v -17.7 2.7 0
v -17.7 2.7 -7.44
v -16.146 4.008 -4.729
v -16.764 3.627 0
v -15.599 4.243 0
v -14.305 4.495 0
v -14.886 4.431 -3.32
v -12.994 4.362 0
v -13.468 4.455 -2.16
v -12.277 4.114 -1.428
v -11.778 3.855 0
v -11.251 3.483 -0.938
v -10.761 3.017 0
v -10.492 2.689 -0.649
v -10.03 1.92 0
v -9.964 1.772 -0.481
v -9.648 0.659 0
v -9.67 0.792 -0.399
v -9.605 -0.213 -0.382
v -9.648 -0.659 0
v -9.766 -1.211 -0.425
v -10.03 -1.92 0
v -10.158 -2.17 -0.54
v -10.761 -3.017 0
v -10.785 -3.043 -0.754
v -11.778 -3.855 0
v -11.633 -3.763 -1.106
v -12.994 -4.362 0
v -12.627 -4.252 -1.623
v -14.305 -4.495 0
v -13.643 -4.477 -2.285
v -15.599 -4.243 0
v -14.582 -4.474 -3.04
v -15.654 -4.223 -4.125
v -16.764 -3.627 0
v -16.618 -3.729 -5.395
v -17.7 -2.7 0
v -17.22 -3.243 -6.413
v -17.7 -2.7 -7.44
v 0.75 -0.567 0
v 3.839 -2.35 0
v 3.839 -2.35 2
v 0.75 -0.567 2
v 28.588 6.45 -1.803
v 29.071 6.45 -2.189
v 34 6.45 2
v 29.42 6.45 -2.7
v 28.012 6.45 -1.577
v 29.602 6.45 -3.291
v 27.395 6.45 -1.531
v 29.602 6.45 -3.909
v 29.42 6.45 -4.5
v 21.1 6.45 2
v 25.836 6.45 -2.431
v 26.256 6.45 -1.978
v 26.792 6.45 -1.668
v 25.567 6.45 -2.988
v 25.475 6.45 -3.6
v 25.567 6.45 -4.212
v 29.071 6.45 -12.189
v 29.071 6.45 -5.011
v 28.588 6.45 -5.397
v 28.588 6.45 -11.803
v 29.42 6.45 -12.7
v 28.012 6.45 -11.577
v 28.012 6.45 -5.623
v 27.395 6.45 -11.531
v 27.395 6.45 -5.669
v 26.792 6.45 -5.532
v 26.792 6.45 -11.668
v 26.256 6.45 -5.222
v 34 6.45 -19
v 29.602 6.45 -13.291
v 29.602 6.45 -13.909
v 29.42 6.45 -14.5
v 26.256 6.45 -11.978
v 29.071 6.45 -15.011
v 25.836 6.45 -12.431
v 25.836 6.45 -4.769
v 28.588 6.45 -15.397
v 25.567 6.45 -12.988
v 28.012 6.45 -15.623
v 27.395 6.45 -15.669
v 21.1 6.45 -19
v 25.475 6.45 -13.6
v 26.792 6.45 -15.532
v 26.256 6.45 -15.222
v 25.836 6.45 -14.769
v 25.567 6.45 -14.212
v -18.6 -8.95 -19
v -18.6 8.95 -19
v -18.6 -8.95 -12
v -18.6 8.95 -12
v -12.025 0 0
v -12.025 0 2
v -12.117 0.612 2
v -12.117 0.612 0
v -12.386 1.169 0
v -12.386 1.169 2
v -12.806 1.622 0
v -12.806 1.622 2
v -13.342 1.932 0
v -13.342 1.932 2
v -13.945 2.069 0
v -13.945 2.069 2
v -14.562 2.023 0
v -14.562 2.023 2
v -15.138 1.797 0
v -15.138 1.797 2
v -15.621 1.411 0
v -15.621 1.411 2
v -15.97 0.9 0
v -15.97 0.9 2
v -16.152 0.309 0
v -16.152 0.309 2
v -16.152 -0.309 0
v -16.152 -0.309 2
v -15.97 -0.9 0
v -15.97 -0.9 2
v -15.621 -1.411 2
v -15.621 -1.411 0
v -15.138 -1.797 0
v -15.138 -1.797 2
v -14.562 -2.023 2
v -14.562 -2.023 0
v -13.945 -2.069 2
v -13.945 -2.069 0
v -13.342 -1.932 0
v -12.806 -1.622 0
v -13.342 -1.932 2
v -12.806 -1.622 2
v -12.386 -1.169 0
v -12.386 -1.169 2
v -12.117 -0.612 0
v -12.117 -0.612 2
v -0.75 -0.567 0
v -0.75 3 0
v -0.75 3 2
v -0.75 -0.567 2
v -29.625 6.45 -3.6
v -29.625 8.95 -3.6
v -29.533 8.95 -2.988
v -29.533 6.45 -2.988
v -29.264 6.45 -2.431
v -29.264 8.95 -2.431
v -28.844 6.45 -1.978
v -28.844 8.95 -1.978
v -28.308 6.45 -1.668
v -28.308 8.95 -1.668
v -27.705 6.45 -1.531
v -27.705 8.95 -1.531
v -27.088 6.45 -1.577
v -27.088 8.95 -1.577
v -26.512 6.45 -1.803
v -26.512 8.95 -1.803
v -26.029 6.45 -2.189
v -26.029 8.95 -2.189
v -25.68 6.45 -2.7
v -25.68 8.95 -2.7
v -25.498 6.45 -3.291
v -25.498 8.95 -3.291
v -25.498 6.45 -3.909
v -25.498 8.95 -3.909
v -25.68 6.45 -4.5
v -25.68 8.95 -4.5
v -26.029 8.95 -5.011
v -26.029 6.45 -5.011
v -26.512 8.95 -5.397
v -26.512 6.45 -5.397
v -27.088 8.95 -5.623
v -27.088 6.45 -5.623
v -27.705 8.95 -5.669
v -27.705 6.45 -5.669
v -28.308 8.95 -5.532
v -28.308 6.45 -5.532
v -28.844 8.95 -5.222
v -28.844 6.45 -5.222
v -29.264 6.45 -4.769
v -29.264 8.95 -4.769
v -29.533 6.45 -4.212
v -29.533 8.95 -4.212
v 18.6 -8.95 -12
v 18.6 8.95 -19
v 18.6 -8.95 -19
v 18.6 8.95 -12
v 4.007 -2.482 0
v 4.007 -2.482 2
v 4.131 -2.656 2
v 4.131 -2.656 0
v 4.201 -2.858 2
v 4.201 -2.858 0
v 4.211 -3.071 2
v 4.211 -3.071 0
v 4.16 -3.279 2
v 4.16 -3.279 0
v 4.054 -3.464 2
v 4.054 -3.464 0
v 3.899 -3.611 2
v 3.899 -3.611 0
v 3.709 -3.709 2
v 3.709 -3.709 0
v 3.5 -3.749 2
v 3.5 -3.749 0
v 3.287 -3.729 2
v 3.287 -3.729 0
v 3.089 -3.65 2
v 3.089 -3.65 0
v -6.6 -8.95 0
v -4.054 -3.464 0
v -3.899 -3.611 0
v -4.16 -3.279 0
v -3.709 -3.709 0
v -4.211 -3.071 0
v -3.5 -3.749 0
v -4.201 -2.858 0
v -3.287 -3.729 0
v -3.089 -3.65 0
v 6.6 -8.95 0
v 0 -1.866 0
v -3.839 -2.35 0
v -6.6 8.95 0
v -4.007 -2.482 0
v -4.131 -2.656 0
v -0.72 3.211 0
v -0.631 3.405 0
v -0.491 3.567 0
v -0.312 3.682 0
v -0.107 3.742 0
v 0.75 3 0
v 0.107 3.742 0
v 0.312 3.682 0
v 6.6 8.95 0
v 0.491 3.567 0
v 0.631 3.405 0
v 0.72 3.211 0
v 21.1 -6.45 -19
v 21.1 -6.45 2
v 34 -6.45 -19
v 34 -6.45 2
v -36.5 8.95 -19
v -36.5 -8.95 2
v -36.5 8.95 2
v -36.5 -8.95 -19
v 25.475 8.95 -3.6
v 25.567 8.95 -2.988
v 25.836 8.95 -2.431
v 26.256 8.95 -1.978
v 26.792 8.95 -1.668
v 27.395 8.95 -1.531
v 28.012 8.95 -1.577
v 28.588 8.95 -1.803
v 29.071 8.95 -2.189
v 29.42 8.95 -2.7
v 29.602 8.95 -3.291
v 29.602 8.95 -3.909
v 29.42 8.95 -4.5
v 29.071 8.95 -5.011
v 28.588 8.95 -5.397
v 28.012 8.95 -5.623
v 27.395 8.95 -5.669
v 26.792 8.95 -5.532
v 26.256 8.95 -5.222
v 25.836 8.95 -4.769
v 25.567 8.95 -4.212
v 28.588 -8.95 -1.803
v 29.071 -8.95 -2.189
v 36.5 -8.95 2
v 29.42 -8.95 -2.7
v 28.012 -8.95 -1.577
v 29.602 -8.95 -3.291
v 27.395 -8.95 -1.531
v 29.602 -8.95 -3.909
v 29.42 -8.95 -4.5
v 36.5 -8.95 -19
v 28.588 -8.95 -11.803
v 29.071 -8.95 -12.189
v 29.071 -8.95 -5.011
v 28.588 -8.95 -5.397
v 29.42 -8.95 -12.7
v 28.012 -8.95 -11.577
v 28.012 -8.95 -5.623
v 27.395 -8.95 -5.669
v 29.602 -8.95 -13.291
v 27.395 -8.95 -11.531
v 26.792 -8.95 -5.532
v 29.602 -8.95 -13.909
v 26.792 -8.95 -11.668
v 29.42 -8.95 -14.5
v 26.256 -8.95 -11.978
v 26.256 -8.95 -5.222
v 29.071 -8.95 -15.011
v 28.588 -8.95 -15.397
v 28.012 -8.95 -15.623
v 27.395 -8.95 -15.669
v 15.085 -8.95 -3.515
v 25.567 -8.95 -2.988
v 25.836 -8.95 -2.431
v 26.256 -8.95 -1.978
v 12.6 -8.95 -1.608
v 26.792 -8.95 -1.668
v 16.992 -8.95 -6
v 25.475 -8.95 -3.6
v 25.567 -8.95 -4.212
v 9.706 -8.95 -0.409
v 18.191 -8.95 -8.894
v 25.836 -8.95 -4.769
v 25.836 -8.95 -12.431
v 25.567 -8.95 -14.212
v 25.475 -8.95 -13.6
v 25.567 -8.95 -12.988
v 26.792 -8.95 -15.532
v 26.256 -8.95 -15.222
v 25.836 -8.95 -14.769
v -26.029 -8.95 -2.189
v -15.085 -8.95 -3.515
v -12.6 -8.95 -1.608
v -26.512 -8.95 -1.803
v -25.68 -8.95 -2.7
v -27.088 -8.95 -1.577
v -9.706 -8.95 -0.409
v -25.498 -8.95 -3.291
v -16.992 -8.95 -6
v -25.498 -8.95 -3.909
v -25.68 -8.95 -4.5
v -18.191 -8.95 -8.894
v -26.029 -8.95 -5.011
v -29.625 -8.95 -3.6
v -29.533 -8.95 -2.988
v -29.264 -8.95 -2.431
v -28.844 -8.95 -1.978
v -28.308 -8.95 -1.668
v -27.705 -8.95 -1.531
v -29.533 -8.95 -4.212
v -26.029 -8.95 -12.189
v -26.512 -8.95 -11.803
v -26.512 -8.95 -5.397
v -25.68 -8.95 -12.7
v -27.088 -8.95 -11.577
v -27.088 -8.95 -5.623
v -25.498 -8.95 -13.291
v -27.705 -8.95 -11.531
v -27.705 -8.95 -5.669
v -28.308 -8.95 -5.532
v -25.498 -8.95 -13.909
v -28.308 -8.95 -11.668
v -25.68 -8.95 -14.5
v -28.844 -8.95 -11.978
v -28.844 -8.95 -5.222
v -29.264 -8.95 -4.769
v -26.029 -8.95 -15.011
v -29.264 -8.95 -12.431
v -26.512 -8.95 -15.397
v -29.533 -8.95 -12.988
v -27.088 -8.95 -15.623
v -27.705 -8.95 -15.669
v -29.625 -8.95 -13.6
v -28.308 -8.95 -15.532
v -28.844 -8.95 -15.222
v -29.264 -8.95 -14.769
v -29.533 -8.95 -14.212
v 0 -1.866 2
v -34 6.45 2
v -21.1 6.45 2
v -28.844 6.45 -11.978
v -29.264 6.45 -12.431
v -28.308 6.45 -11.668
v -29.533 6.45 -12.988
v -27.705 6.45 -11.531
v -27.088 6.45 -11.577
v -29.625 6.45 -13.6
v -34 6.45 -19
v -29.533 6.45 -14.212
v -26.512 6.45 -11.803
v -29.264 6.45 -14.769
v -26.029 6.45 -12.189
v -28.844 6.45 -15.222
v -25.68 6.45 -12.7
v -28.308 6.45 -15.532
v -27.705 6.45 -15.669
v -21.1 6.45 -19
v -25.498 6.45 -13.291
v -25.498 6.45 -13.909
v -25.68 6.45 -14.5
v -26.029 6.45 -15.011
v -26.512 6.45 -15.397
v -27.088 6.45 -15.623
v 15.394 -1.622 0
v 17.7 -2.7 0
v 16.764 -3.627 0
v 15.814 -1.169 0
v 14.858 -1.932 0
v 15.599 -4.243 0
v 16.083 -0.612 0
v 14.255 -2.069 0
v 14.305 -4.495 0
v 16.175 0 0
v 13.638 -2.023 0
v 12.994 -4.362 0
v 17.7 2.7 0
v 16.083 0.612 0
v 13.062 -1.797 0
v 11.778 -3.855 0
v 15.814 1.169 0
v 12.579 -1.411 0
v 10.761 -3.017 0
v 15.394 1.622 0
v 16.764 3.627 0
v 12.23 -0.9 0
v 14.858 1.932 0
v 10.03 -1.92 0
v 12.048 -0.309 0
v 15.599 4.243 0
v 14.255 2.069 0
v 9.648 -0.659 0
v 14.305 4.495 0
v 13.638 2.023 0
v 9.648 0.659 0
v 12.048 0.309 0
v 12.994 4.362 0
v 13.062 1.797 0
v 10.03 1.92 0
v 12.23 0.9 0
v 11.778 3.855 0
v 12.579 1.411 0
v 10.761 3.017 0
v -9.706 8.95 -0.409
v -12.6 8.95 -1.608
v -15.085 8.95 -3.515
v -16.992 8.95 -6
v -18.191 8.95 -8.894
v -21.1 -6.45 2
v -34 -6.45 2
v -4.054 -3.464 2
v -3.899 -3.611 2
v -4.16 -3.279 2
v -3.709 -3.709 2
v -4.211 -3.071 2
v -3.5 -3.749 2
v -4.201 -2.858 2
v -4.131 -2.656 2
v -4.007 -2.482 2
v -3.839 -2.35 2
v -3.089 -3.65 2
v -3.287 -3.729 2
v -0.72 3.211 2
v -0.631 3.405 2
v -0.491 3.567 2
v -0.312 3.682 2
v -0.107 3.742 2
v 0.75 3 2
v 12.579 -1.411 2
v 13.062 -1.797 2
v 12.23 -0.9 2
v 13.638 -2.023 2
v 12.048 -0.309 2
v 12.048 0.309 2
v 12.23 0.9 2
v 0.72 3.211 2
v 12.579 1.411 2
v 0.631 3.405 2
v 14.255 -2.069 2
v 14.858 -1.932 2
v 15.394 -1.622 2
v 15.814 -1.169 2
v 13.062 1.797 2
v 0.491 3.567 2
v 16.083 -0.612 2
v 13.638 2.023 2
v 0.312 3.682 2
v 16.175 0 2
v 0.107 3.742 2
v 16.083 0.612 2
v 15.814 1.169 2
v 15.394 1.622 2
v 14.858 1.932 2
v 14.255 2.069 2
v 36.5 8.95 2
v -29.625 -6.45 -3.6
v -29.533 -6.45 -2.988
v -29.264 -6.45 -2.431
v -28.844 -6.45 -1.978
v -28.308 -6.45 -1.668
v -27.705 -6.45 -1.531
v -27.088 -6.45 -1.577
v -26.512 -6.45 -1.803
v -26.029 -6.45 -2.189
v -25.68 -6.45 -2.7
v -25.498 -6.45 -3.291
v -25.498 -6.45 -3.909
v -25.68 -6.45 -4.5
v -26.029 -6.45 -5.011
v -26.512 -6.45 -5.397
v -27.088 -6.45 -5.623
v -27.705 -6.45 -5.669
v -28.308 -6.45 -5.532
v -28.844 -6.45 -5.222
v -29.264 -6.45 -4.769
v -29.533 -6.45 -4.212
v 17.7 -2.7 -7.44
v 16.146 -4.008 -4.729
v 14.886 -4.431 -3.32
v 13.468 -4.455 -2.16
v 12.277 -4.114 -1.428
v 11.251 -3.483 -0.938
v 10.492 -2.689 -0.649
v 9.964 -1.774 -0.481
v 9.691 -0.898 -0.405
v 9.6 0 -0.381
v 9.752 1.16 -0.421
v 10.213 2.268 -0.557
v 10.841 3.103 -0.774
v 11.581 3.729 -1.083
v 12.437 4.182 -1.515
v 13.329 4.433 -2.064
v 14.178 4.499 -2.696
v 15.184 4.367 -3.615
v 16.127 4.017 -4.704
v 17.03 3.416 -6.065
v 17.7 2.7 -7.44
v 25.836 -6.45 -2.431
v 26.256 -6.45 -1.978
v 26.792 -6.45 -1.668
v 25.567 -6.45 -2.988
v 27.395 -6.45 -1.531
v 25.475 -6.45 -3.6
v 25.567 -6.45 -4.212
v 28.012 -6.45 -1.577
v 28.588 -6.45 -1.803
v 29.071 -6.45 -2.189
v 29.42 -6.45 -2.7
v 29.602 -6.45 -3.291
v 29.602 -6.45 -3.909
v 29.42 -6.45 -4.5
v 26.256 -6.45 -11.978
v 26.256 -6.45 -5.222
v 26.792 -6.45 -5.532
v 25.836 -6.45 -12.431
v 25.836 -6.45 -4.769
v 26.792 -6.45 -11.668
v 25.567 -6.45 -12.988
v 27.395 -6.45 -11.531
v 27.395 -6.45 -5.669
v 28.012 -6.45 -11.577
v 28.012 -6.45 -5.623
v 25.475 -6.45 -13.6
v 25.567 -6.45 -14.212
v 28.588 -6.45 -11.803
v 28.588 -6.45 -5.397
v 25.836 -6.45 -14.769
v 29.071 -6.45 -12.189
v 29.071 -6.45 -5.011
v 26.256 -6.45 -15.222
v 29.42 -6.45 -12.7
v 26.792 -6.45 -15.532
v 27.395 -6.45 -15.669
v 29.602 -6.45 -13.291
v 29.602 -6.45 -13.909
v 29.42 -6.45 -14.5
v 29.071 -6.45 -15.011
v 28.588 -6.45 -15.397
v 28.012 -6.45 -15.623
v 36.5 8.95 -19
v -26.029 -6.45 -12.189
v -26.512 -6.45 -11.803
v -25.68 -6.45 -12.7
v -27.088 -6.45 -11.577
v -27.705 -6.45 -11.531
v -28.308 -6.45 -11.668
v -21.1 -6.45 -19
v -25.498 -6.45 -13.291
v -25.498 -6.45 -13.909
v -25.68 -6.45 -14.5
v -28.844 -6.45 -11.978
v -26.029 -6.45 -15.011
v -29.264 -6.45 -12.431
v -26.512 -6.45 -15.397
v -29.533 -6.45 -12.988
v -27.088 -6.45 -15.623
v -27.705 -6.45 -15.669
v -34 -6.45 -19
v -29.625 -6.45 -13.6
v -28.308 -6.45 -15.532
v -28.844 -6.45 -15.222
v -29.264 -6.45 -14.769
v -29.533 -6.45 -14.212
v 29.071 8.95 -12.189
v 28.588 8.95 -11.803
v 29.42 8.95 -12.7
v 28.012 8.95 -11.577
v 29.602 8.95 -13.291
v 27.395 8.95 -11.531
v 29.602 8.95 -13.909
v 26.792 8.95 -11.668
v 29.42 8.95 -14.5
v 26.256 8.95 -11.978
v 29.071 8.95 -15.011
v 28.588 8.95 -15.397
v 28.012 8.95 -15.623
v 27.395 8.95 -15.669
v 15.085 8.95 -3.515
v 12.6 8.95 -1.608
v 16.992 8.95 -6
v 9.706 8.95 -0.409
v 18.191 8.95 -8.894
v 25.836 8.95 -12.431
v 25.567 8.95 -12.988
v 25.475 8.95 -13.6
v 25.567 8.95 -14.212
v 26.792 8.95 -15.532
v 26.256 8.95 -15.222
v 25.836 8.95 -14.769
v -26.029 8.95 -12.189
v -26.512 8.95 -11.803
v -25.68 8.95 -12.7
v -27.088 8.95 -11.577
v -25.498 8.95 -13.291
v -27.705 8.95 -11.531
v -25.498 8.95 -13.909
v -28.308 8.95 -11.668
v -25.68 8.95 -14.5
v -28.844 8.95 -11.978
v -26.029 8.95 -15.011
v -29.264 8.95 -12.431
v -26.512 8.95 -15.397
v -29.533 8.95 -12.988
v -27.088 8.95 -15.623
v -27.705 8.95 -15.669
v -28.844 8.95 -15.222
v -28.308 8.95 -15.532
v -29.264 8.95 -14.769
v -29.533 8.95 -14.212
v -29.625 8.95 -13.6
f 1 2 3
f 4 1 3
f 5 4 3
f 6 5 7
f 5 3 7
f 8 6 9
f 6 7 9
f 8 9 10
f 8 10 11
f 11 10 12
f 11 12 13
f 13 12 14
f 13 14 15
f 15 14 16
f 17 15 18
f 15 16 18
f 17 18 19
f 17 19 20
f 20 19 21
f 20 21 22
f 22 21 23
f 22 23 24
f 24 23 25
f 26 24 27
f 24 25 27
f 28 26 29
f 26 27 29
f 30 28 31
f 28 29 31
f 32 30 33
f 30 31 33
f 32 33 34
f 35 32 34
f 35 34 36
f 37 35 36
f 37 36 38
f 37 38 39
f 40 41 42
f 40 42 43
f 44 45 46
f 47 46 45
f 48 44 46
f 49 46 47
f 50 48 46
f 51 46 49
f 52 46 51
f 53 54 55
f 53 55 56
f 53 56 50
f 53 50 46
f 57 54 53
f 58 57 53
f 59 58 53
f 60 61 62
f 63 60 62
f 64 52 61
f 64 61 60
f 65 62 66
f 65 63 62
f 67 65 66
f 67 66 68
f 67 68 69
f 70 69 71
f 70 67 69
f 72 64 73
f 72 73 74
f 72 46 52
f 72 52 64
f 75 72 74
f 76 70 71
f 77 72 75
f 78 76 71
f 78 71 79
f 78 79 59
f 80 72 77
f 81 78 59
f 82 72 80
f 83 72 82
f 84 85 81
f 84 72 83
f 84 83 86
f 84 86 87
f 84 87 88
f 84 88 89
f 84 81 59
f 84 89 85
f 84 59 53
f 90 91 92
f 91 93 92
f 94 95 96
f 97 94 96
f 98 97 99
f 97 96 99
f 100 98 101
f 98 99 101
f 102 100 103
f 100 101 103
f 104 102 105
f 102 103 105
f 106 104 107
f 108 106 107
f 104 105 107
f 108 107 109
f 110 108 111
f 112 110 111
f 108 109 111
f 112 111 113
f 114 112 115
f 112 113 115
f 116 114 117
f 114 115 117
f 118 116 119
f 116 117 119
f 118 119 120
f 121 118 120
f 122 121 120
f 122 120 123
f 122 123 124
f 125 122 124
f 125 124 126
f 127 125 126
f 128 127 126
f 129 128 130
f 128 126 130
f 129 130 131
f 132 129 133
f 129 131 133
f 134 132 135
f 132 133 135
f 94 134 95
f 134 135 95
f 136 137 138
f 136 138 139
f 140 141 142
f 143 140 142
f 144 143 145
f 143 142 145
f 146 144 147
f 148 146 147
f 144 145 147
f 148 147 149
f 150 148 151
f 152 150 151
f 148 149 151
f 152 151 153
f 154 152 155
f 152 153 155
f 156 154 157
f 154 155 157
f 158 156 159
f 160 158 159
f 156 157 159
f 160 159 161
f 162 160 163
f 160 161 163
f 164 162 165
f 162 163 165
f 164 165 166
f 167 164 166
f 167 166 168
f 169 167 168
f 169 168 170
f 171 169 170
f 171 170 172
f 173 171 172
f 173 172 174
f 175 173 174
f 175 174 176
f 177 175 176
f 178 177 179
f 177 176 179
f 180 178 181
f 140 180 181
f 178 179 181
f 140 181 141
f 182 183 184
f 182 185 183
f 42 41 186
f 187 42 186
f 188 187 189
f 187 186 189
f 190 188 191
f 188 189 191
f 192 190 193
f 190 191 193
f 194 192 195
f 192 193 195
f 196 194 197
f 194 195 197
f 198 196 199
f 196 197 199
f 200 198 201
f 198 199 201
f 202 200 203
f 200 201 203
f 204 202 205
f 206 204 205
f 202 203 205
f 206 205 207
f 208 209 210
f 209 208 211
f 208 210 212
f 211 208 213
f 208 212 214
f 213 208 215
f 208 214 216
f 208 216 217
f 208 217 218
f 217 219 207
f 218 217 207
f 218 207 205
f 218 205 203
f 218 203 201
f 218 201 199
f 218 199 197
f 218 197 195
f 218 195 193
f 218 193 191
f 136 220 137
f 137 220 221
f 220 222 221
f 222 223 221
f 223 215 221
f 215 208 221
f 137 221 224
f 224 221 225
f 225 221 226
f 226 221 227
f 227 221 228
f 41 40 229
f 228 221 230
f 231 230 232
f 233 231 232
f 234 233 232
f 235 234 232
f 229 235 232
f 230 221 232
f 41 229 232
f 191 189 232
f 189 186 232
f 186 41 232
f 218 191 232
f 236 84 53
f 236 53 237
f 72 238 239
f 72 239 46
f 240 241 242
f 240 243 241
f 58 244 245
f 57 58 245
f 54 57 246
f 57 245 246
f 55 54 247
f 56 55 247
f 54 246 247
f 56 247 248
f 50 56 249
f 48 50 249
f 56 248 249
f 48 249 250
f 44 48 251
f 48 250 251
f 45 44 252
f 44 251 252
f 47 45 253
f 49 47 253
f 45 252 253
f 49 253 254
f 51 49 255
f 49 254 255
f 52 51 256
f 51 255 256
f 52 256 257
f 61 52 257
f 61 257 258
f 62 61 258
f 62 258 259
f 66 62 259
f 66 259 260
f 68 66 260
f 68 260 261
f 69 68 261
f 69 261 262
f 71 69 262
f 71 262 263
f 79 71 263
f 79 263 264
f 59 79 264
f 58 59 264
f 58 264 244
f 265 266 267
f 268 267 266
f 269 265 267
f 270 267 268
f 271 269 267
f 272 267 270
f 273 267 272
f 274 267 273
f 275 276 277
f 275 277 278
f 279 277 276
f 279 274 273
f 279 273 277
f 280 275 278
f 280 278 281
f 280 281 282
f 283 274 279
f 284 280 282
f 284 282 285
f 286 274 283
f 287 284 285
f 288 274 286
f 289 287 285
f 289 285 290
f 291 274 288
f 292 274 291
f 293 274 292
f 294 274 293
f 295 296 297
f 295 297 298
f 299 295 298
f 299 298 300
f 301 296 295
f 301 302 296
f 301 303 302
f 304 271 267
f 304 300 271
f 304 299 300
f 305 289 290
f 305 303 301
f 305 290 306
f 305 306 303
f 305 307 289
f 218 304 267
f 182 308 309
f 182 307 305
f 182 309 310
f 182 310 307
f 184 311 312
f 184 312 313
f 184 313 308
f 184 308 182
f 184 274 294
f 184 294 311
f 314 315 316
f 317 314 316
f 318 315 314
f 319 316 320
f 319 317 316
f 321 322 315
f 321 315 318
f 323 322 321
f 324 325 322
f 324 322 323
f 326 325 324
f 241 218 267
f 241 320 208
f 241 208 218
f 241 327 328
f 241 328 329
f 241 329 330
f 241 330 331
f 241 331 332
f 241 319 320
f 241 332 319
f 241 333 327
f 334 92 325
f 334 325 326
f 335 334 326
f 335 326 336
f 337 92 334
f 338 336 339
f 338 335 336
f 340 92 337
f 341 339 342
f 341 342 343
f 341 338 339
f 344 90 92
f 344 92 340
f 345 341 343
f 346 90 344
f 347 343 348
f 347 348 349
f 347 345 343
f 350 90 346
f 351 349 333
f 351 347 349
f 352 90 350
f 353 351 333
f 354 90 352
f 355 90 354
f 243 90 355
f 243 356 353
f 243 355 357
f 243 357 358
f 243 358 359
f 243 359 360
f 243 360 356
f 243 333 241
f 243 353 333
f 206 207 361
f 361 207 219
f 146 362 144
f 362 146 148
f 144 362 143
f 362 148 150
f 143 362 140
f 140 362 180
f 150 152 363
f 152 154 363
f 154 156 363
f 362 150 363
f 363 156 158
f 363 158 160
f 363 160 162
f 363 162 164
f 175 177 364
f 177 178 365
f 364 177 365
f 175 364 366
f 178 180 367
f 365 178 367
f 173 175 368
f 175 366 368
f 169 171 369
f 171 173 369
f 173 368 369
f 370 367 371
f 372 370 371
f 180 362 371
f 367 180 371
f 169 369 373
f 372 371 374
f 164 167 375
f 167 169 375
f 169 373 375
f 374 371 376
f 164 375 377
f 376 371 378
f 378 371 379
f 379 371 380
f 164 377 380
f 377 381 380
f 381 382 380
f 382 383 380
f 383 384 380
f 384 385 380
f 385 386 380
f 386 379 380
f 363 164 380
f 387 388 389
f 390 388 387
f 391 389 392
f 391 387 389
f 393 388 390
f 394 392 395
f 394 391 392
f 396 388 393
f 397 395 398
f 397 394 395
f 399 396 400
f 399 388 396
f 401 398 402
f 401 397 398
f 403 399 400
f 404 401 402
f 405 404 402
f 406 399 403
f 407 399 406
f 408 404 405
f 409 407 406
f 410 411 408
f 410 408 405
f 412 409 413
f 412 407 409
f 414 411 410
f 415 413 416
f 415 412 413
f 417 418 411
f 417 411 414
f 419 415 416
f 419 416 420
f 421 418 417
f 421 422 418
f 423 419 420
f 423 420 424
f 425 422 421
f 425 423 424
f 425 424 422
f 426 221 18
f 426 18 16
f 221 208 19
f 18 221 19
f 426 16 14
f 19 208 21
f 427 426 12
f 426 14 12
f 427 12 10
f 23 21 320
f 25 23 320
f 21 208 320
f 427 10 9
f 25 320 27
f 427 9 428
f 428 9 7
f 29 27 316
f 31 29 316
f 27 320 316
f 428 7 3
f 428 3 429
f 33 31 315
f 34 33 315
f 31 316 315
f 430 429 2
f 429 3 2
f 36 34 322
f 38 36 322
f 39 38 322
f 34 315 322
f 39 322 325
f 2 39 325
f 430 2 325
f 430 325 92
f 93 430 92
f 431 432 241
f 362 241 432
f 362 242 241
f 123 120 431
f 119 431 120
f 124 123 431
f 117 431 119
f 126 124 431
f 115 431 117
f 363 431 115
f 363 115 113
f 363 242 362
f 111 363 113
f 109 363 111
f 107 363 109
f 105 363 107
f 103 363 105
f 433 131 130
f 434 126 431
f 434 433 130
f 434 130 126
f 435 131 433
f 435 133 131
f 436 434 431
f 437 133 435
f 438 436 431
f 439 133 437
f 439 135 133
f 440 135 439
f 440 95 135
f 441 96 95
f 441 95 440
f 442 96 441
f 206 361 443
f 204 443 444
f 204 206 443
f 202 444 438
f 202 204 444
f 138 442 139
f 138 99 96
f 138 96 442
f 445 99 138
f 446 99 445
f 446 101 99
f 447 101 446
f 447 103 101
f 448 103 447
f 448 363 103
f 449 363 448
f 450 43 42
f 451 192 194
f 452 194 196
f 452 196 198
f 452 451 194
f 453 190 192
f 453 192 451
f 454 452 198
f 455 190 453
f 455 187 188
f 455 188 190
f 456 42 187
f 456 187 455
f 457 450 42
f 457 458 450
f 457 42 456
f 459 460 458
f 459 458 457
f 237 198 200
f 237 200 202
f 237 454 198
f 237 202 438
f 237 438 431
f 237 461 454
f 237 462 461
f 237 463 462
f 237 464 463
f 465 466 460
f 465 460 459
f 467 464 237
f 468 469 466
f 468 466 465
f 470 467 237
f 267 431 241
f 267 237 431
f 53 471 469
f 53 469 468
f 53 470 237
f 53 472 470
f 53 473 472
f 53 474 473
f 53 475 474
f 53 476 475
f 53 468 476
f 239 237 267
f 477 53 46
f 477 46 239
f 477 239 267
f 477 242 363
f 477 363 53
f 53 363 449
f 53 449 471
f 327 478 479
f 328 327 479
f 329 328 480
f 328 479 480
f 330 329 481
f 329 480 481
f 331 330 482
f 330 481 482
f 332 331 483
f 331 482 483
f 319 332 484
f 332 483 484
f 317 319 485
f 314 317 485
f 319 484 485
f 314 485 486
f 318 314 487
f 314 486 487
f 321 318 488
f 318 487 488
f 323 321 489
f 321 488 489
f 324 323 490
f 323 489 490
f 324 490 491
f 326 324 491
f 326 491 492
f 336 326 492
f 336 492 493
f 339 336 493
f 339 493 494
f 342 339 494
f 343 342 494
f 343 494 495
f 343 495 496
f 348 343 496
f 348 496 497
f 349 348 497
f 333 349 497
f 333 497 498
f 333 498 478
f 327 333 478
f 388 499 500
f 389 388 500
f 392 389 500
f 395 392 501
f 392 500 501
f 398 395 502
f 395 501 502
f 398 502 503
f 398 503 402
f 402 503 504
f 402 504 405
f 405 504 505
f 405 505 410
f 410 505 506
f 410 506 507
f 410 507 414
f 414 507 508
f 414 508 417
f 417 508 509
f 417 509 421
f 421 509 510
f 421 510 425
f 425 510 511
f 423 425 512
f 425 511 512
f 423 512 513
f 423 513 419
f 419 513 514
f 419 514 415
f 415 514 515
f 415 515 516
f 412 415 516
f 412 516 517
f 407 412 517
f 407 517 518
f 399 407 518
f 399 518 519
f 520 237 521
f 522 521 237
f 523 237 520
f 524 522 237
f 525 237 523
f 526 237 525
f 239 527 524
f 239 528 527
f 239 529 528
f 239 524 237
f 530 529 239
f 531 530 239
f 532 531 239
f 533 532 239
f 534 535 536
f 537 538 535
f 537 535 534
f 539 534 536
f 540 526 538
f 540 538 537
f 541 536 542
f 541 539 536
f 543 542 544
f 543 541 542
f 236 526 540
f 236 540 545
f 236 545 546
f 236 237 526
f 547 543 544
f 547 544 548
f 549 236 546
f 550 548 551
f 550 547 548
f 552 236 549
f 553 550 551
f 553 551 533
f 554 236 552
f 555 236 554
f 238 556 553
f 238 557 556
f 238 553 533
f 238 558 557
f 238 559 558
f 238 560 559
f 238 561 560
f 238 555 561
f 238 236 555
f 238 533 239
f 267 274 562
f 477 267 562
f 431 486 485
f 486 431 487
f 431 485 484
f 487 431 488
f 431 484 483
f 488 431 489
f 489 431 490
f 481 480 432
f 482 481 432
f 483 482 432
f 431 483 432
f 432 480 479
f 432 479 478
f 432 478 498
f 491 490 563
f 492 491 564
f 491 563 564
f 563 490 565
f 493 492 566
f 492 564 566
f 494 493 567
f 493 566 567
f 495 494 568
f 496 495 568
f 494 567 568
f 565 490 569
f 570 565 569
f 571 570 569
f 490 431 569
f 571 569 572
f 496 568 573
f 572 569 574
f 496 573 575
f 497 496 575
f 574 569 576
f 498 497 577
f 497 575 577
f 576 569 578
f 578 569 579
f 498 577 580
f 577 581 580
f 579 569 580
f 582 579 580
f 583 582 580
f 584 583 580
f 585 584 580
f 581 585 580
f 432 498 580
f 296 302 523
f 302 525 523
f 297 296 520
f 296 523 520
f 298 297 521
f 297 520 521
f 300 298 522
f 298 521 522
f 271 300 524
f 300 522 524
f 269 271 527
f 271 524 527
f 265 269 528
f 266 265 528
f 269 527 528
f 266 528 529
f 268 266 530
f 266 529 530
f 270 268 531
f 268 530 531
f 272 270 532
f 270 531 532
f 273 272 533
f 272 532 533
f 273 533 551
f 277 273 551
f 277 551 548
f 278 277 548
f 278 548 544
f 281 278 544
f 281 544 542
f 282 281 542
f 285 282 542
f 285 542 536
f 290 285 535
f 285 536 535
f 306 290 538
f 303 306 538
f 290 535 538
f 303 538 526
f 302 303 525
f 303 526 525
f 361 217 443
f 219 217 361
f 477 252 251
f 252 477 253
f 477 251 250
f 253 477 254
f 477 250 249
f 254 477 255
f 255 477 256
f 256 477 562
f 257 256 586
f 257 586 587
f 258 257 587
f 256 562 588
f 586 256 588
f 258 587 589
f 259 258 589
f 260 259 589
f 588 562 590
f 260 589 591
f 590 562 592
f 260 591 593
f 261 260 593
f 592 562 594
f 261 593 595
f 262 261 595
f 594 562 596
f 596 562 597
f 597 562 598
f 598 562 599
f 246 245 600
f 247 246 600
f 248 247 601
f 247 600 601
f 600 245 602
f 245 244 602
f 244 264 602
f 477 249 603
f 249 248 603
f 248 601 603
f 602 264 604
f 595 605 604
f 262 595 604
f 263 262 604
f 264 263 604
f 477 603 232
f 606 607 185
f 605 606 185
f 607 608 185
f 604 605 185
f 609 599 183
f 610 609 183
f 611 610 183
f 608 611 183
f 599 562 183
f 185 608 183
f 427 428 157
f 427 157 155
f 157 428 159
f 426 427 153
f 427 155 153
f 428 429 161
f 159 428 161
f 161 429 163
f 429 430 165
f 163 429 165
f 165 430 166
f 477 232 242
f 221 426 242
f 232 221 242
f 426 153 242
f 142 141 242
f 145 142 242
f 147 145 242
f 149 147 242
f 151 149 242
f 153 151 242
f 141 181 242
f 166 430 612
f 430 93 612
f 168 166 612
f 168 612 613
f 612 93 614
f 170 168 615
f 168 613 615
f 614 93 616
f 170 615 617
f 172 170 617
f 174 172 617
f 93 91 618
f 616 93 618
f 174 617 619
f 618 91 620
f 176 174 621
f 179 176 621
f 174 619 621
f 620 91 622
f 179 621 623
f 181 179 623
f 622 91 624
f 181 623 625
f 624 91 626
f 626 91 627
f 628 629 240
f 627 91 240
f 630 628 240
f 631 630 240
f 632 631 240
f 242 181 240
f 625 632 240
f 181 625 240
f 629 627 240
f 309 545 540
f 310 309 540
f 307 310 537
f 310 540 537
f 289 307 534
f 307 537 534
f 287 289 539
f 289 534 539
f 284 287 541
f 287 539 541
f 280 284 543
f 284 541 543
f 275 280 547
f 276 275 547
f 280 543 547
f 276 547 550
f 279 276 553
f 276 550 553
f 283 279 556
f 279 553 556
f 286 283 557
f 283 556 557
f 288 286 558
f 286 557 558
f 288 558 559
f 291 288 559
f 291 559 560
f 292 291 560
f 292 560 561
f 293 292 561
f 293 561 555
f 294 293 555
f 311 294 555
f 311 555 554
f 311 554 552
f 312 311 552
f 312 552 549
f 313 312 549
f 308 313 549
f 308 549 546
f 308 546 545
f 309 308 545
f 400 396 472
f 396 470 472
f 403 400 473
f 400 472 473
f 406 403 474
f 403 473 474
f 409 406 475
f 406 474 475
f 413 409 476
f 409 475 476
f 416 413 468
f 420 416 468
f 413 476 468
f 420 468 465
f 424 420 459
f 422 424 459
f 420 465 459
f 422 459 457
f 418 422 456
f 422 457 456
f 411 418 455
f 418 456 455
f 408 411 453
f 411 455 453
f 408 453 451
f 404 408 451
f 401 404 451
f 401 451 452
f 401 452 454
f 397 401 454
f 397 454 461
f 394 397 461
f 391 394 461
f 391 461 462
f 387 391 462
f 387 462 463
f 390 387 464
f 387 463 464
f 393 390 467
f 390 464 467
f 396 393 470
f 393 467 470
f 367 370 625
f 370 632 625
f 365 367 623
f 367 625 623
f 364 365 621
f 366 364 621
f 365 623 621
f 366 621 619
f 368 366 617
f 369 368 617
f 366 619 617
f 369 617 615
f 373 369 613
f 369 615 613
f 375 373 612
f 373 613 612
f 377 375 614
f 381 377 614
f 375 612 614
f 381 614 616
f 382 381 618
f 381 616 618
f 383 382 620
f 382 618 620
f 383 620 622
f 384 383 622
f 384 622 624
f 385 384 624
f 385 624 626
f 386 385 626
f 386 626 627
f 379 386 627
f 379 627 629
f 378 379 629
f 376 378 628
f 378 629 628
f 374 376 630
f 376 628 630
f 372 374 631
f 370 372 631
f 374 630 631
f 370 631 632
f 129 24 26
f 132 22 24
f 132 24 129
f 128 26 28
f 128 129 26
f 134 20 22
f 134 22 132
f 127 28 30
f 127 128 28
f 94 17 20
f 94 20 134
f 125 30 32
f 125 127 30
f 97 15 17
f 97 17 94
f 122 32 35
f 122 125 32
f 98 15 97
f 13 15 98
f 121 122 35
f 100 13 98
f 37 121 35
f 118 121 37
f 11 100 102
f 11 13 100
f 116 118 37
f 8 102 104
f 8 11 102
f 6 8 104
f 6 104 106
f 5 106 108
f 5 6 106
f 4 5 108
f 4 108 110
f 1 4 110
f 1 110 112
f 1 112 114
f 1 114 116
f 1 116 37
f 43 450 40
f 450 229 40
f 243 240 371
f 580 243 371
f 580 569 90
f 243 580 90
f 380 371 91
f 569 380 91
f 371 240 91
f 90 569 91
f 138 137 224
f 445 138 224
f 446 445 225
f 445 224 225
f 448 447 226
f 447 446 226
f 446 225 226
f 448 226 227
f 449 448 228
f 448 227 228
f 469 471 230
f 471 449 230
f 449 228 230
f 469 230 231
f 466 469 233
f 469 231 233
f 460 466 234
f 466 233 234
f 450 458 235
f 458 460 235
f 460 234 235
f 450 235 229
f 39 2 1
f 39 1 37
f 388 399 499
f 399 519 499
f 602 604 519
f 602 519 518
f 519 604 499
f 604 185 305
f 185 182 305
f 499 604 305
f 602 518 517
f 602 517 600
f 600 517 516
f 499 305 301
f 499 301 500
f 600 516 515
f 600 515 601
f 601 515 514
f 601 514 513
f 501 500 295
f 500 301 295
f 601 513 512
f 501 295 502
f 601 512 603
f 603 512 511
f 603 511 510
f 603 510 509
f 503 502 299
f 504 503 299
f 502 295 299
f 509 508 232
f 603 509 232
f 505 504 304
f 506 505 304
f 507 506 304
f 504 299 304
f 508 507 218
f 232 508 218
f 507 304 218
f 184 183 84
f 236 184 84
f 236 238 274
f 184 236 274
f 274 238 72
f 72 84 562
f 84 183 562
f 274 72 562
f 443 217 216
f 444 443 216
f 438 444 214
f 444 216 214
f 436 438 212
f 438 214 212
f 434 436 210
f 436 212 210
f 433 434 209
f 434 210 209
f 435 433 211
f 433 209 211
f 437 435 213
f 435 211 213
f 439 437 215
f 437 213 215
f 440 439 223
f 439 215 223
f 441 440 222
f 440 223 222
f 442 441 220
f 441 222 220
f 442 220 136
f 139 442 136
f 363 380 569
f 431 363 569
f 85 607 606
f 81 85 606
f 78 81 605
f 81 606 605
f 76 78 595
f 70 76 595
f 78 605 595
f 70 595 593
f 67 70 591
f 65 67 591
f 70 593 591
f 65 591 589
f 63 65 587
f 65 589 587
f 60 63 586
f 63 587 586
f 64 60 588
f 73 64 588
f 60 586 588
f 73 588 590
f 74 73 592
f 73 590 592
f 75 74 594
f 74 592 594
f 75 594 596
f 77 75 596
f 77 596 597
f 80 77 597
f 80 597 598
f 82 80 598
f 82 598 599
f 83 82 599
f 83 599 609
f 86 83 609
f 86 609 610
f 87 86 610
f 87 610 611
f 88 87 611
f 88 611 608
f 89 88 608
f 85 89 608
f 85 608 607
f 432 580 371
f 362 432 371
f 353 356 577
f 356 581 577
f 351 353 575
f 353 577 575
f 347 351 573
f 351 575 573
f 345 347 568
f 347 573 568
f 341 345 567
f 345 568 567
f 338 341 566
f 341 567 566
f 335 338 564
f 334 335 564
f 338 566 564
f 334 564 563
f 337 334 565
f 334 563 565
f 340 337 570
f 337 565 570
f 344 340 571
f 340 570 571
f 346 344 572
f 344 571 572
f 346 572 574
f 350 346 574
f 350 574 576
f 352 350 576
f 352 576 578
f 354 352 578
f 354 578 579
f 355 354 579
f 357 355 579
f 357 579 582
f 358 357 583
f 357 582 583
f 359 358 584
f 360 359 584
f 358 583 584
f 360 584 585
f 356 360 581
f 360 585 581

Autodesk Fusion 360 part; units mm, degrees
sketch "Sketch1" plane through (0, 0, 0) normal (0, 0, 1) x (1, 0, 0)
  line L0 (7.1, 7.1) -> (-7.1, 7.1)
  line L1 (-7.1, 7.1) -> (-7.1, -7.1)
  line L2 (-7.1, -7.1) -> (7.1, -7.1)
  line L3 (7.1, -7.1) -> (7.1, 7.1)
  line L4 (0, 3) -> (0, -1) construction
  line L5 (-0.75, 3) -> (-0.75, -1)
  line L6 (0.75, 3) -> (0.75, -1)
  circle A0 centre (0, 3) radius 0.75
  line L7 (-3.0891, -3.6495) -> (0.375, -1.6495)
  circle A1 centre (-3.4641, -3) radius 0.75
  line L8 (-3.8391, -2.3505) -> (-0.375, -0.3505)
  line L9 (-3.4641, -3) -> (0, -1) construction
  line L10 (3.8391, -2.3505) -> (0.375, -0.3505)
  circle A2 centre (3.4641, -3) radius 0.75
  line L11 (3.0891, -3.6495) -> (-0.375, -1.6495)
  line L12 (3.4641, -3) -> (0, -1) construction
  line L13 (-4.2141, 3.75) -> (4.2141, 3.75)
  line L14 (4.2141, 3.75) -> (4.2141, -3.75)
  line L15 (4.2141, -3.75) -> (-4.2141, -3.75)
  line L16 (-4.2141, -3.75) -> (-4.2141, 3.75)
  line L17 (-7.1, 0) -> (7.1, 0) construction
  line L18 (0, 7.1) -> (0, -7.1) construction
  point P0 (0, -3.75)
  point P1 (-4.2141, 0)
  dimension "d38" = 14.2
  dimension "d41" = 4
  dimension "d42" = 0.75
  dimension "d43" = -0.75
  dimension "d45" = 360
extrude "Extrude1" add sketch "Sketch1" along normal blind 2 contours L0 L1 L2 L3 | L5 A0 A1 L8 L13 L16 | L6 A0 L10 A2 L13 L14 | A1 L15 L16 | A2 L14 L15 | L7 A1 A2 L11 L15
sketch "Sketch2" plane through (0, 0, 0) normal (0, 0, 1) x (1, 0, 0)
  line L0 (-33.9, 6.35) -> (-21.2, 6.35) construction
  line L1 (-21.2, 6.35) -> (-21.2, -6.35) construction
  line L2 (-21.2, -6.35) -> (-33.9, -6.35) construction
  line L3 (-33.9, -6.35) -> (-33.9, 6.35) construction
  line L4 (21.2, 6.35) -> (33.9, 6.35) construction
  line L5 (33.9, 6.35) -> (33.9, -6.35) construction
  line L6 (33.9, -6.35) -> (21.2, -6.35) construction
  line L7 (21.2, -6.35) -> (21.2, 6.35) construction
  line L8 (-21.2, 0) -> (21.2, 0) construction
  line L9 (-21.1, -6.45) -> (-34, -6.45)
  line L10 (-34, -6.45) -> (-34, 6.45)
  line L11 (-34, 6.45) -> (-21.1, 6.45)
  line L12 (-21.1, 6.45) -> (-21.1, -6.45)
  line L13 (-18.6, -8.95) -> (-36.5, -8.95)
  line L14 (-36.5, -8.95) -> (-36.5, 8.95)
  line L15 (-36.5, 8.95) -> (-18.6, 8.95)
  line L16 (-18.6, 8.95) -> (-18.6, -8.95)
  line L17 (0, 2.5) -> (0, 20)
  line L18 (34, -6.45) -> (34, 6.45)
  line L19 (34, 6.45) -> (21.1, 6.45)
  line L20 (21.1, 6.45) -> (21.1, -6.45)
  line L21 (21.1, -6.45) -> (34, -6.45)
  line L22 (36.5, -8.95) -> (36.5, 8.95)
  line L23 (36.5, 8.95) -> (18.6, 8.95)
  line L24 (18.6, -8.95) -> (36.5, -8.95)
  line L25 (18.6, 8.95) -> (18.6, -8.95)
  line L26 (-18.6, -2.6) -> (-18.6, -8.95)
  line L27 (-18.6, 8.95) -> (18.6, 8.95)
  line L28 (18.6, -8.95) -> (-18.6, -8.95)
  line L29 (-7.1, 7.1) -> (-7.1, -7.1)
  line L30 (-7.1, -7.1) -> (7.1, -7.1)
  line L31 (7.1, -7.1) -> (7.1, 7.1)
  line L32 (7.1, 7.1) -> (-7.1, 7.1)
  dimension "d18" = 12.7
  dimension "d19" = 12.7
  dimension "d20" = 42.4
  dimension "d23" = -2.5
extrude "Extrude2" add sketch "Sketch2" along normal blind 2
extrude "Extrude3" add sketch "Sketch2" against normal blind 19 contours L13 L14 L15 L16 L26 | L22 L23 L24 L25
fillet "Fillet1" radius 12 2 edges at (-18.6, 0, 0) (18.6, 0, 0)
sketch "Sketch3" plane through (0, 8.95, 0) normal (0, 1, 0) x (-1, 0, 0)
  line L0 (36.5, -19) -> (36.5, 2)
  line L1 (36.5, 2) -> (-36.5, 2)
  line L2 (18.6, -12) -> (18.6, -19)
  line L3 (-36.5, -19) -> (-18.6, -19)
  circle A0 centre (-27.55, -13.6) radius 2.075
  circle A1 centre (-27.55, -3.6) radius 2.075
  line L4 (-27.55, -19) -> (-27.55, 2) construction
  line L5 (-36.5, 2) -> (-36.5, -19)
  line L6 (-18.6, -19) -> (-18.6, -12)
  line L7 (18.6, -19) -> (36.5, -19)
  line L8 (0, 1.75) -> (0, 22.5)
  circle A2 centre (27.55, -13.6) radius 2.075
  circle A3 centre (27.55, -3.6) radius 2.075
  dimension "d32" = 4.15
  dimension "d33" = 10
  dimension "d34" = 5.6
extrude "Extrude4" cut sketch "Sketch3" against normal blind 17.9
sketch "Sketch4" plane through (0, 0, 2) normal (0, 0, 1) x (1, 0, 0)
  line L0 (36.5, -8.95) -> (36.5, 8.95)
  line L1 (36.5, 8.95) -> (-36.5, 8.95)
  line L2 (-36.5, 8.95) -> (-36.5, -8.95)
  line L3 (-36.5, -8.95) -> (36.5, -8.95)
  line L4 (-34, 6.45) -> (-21.1, 6.45)
  line L5 (-21.1, 6.45) -> (-21.1, -6.45)
  line L6 (-21.1, -6.45) -> (-34, -6.45)
  line L7 (-34, -6.45) -> (-34, 6.45)
  line L8 (34, -6.45) -> (21.1, -6.45)
  line L9 (21.1, -6.45) -> (21.1, 6.45)
  line L10 (21.1, 6.45) -> (34, 6.45)
  line L11 (34, 6.45) -> (34, -6.45)
  line L12 (0.75, -0.567) -> (3.8391, -2.3505)
  arc A0 (3.0891, -3.6495) -> (3.8391, -2.3505) centre (3.4641, -3) ccw
  line L13 (3.0891, -3.6495) -> (0, -1.866)
  line L14 (0, -1.866) -> (-3.0891, -3.6495)
  arc A1 (-3.8391, -2.3505) -> (-3.0891, -3.6495) centre (-3.4641, -3) ccw
  line L15 (-3.8391, -2.3505) -> (-0.75, -0.567)
  line L16 (-0.75, -0.567) -> (-0.75, 3)
  arc A2 (0.75, 3) -> (-0.75, 3) centre (0, 3) ccw
  line L17 (0.75, 3) -> (0.75, -0.567)
  line L18 (21.1, -6.45) -> (21.1, 6.45)
  line L19 (-21.1, 6.45) -> (-21.1, -6.45)
  circle A3 centre (-14.1, 0) radius 2.075
  line L20 (-21.1, 0) -> (21.1, 0) construction
  line L21 (0, 2.5) -> (0, 20)
  circle A4 centre (14.1, 0) radius 2.075
  dimension "d47" = 4.15
  dimension "d48" = 7
extrude "Extrude5" cut sketch "Sketch4" against normal blind 21 contours A3 | A4
ref_plane "WorkPlane1" through (0, 0, -8) normal (0, 0, -1) x (-1, 0, 0)
sketch "Sketch5" plane through (0, 0, -8) normal (0, 0, -1) x (-1, 0, 0)
  line L0 (-21.1, 6.45) -> (-21.1, -6.45)
  line L1 (21.1, -6.45) -> (21.1, 6.45)
  line L2 (-21.1, 0) -> (21.1, 0) construction
  circle A0 centre (-14.1, 0) radius 4.5
  line L3 (-17.7, 2.7) -> (-17.7, -2.7)
  line L4 (0, 1.75) -> (0, 22.5)
  circle A1 centre (14.1, 0) radius 4.5
  line L5 (17.7, 2.7) -> (17.7, -2.7)
  dimension "d52" = 9
  dimension "d53" = 7
  dimension "d54" = 3.6
extrude "Extrude6" cut sketch "Sketch5" against normal blind 8 contours A0 L3 | A1 L5 picked at (-15.0162, 0.2196) picked at (14.4429, 0.1257)
equation "mounting_size = 1.5 mm"
equation "d16 = frontal_width"
equation "d21 = -tolerance_bar"
equation "tolerance_bar = 0.1 mm"
equation "d25 = frontal_width"
equation "d30 = 13 mm - ( 4 / 4 ) * 1 mm"
equation "tolerance_hole = 0.15 mm"
equation "d32 = 4 mm + tolerance_hole"
equation "d42 = mounting_size / 2"
equation "d43 = -d42"
equation "frontal_width = 2 mm"
equation "d47 = 4 mm + tolerance_hole"
